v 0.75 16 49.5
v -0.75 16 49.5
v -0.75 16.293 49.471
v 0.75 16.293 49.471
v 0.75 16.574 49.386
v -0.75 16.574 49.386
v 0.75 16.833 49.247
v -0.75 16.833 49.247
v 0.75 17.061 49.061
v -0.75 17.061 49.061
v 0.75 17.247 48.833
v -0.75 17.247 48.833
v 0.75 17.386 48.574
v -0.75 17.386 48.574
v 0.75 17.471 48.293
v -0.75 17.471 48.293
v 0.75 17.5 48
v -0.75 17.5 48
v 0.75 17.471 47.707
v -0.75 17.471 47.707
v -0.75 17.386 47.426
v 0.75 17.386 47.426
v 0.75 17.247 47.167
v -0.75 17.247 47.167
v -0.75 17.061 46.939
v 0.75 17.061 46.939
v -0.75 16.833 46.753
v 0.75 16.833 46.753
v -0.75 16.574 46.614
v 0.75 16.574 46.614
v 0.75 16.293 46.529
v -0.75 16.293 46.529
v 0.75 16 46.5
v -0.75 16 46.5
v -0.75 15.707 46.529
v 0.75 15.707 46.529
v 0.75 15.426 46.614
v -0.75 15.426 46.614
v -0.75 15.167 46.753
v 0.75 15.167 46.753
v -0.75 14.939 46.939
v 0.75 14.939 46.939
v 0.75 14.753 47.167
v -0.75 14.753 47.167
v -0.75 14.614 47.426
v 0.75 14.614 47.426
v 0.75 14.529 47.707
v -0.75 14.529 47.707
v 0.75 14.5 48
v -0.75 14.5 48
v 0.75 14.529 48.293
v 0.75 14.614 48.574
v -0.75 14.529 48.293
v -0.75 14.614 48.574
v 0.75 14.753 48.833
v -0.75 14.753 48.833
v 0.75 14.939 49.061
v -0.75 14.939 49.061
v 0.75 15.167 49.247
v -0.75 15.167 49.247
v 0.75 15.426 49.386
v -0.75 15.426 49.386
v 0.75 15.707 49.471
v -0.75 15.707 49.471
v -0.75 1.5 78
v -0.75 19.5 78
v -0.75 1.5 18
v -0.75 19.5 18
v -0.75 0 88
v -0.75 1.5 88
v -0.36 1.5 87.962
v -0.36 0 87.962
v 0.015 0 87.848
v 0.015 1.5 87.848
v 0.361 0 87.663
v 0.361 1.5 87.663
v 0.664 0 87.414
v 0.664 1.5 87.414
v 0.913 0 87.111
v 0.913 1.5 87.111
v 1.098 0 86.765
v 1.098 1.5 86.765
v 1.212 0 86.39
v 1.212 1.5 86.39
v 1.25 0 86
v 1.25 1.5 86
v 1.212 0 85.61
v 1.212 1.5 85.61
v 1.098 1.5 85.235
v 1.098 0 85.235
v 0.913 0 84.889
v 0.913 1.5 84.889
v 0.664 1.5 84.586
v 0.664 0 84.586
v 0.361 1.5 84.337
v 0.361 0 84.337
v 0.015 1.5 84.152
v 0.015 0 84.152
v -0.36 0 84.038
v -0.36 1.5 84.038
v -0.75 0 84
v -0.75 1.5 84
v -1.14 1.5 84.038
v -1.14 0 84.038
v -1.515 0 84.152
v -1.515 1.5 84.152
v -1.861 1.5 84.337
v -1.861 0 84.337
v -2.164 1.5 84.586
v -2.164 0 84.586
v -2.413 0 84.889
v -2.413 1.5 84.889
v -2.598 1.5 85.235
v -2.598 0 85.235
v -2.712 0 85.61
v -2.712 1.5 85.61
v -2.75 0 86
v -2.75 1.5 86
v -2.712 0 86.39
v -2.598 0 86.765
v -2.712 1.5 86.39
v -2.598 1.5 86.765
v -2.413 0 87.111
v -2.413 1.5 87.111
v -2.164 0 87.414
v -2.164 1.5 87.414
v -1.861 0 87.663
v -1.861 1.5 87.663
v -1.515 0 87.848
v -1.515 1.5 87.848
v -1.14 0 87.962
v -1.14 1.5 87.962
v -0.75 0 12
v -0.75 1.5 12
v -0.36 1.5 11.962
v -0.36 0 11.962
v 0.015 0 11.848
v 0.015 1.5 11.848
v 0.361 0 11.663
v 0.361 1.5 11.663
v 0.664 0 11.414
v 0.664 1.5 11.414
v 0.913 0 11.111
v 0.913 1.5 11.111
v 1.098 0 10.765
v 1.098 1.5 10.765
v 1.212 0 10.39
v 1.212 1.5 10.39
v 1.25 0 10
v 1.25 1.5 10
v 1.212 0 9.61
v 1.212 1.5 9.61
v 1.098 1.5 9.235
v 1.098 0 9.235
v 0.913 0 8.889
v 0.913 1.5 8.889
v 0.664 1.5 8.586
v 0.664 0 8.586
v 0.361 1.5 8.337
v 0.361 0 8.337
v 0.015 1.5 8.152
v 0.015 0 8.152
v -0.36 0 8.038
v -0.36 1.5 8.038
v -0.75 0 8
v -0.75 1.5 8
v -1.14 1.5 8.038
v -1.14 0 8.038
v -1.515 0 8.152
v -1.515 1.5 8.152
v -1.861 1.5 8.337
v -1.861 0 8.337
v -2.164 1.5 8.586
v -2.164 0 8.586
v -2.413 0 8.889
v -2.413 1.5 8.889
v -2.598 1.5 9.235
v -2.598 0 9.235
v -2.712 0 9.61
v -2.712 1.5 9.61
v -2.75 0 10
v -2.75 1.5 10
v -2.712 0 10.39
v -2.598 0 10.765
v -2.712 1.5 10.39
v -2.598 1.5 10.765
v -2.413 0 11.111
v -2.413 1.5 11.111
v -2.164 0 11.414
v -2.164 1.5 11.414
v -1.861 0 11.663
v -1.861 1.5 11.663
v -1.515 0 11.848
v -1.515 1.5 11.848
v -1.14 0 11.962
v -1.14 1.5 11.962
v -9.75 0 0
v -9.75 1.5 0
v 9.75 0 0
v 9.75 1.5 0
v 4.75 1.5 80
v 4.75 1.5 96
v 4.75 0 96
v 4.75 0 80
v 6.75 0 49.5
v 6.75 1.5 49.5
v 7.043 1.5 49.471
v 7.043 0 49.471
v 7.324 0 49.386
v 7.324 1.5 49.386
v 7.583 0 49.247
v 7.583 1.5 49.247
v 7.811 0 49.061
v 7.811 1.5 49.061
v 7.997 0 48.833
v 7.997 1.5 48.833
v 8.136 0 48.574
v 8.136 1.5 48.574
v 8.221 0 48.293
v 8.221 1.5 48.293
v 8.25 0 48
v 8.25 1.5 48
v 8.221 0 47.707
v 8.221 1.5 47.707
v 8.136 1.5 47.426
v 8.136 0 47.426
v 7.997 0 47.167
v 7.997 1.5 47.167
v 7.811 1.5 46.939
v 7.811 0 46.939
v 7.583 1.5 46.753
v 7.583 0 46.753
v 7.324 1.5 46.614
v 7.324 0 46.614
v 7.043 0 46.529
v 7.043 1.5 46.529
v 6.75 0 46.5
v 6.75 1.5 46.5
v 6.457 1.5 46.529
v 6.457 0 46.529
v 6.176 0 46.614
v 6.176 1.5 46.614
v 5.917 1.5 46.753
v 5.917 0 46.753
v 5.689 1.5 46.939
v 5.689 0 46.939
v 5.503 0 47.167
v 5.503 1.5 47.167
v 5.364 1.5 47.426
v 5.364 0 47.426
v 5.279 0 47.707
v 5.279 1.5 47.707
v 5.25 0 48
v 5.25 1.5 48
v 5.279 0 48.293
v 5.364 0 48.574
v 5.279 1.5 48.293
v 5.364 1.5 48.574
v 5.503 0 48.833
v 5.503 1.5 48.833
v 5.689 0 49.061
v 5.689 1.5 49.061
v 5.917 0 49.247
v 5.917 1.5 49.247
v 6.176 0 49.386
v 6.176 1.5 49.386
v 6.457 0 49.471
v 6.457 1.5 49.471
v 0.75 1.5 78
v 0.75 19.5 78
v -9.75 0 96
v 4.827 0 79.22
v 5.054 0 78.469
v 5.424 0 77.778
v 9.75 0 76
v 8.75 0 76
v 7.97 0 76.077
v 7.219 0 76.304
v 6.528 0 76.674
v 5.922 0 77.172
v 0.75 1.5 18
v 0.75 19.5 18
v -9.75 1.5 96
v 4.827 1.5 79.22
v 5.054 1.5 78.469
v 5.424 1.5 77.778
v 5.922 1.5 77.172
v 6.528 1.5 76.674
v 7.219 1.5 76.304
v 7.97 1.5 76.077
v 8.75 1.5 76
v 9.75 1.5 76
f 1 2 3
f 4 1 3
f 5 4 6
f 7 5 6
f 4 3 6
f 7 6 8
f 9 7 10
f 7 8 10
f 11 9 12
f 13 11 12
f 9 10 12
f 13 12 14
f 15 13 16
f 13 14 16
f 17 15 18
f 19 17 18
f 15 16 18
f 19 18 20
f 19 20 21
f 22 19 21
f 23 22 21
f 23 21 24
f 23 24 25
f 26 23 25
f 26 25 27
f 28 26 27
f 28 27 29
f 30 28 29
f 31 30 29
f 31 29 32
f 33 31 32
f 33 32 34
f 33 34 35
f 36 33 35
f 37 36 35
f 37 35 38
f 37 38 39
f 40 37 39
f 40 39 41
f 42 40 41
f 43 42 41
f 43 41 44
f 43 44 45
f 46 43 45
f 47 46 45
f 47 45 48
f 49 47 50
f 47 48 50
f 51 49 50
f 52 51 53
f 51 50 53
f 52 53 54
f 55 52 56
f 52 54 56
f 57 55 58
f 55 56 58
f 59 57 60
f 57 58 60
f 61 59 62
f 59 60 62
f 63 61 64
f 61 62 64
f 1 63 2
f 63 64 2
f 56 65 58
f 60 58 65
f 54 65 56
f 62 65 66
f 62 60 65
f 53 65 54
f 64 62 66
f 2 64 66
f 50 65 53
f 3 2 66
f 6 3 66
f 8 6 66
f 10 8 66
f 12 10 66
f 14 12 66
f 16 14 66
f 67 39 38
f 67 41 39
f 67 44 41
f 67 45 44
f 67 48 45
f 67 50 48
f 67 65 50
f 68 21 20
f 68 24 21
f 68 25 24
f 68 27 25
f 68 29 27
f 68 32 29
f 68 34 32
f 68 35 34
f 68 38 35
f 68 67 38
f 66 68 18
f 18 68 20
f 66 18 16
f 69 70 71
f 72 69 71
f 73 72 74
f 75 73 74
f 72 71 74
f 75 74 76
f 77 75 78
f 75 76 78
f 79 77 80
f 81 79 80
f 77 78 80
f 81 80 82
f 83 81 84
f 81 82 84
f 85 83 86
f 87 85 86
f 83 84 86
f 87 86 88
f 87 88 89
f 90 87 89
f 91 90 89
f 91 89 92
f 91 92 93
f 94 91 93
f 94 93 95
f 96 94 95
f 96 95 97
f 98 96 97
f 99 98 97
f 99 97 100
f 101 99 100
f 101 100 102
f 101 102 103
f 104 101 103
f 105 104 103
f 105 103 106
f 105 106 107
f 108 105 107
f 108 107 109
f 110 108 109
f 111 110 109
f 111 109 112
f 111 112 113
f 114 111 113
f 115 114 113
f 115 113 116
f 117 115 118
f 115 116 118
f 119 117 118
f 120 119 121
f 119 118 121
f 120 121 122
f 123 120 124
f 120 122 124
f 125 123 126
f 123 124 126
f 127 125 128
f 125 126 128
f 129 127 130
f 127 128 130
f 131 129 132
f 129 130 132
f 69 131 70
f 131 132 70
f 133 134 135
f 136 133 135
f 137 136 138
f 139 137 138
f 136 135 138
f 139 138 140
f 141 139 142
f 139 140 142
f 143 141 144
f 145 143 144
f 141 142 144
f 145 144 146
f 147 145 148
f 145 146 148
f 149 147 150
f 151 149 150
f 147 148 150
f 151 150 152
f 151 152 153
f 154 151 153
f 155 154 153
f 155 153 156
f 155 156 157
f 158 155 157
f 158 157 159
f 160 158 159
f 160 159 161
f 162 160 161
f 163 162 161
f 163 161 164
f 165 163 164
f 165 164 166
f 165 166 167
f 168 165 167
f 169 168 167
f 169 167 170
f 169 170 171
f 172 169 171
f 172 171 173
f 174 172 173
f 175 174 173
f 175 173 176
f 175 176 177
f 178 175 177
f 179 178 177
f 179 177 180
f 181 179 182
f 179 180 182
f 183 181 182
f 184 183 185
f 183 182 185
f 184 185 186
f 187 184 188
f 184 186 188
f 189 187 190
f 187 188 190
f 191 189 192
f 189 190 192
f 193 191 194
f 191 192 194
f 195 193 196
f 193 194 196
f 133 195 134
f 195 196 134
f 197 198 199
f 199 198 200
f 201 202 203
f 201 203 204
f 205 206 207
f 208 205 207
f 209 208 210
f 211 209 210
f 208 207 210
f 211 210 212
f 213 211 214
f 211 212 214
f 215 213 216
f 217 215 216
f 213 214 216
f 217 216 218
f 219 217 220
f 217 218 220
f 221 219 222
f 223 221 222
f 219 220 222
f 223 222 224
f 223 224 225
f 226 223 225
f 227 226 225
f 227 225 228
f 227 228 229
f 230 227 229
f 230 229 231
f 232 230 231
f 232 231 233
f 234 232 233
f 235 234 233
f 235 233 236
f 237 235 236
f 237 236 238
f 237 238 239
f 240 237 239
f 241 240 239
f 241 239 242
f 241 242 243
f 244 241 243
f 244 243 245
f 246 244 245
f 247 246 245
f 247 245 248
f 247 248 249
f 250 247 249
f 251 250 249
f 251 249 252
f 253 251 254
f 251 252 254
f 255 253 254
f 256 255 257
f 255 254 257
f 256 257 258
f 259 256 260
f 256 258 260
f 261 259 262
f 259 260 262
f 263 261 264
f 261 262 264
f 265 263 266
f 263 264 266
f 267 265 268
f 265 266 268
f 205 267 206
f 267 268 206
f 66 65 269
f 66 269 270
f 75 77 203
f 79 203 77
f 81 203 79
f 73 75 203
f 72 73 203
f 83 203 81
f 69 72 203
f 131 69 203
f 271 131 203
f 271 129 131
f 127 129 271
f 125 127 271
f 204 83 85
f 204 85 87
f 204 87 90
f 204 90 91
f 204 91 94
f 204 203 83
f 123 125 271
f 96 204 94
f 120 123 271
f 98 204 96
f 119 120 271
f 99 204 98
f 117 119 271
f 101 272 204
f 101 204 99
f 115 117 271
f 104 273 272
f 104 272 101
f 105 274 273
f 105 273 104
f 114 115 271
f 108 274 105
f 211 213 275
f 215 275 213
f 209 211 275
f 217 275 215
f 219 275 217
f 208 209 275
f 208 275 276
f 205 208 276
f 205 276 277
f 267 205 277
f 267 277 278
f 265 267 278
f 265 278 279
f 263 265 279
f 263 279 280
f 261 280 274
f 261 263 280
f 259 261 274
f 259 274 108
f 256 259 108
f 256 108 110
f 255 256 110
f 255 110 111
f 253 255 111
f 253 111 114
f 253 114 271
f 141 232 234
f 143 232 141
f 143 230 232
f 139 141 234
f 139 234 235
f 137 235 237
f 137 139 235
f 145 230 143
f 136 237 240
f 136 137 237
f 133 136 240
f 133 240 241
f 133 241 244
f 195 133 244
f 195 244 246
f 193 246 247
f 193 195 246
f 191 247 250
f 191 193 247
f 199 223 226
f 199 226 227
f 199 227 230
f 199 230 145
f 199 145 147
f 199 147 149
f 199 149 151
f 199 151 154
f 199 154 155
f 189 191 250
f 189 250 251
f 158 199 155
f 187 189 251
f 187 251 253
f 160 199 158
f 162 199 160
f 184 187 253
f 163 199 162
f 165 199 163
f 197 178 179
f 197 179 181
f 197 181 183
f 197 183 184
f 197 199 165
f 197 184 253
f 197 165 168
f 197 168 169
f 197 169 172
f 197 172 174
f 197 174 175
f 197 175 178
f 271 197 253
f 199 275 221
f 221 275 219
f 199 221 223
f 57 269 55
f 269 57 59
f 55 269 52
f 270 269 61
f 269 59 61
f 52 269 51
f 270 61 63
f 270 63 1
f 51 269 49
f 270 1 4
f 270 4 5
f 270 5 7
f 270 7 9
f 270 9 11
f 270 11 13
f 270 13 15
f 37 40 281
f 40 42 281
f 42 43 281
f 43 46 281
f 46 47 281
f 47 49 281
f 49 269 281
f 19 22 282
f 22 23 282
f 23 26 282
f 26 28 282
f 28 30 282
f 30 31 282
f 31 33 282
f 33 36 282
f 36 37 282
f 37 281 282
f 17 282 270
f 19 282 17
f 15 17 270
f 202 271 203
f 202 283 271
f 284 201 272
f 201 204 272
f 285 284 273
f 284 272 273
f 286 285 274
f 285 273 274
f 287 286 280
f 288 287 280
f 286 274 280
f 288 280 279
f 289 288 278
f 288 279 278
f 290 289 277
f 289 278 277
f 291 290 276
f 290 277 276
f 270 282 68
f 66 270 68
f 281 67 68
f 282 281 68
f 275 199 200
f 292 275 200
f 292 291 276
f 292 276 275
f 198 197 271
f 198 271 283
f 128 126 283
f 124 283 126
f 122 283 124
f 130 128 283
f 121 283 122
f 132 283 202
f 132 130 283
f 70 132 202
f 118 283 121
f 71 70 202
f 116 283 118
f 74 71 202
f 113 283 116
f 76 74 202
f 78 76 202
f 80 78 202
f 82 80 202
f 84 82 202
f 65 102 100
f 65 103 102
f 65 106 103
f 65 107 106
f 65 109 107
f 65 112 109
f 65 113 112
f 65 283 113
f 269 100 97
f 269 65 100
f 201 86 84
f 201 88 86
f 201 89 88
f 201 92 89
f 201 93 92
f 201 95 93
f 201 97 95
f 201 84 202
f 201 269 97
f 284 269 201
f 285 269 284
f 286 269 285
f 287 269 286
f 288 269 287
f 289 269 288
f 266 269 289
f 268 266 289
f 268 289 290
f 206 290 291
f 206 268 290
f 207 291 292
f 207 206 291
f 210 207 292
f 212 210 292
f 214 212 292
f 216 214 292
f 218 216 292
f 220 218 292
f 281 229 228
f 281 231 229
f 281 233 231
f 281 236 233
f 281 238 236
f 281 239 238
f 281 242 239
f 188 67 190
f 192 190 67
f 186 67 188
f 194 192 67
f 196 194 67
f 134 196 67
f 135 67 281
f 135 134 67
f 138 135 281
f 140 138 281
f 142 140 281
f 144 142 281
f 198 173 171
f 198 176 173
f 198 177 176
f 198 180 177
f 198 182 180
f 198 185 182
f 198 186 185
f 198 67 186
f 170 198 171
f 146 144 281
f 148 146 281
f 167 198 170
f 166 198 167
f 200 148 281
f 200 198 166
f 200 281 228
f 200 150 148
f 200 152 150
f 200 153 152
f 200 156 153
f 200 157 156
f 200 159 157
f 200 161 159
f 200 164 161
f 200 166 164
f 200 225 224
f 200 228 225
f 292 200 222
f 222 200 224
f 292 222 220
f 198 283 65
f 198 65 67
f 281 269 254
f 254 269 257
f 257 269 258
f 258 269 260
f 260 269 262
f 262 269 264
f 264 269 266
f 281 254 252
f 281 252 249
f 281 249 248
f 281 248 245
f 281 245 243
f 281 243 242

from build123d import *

# Parameters (mm, degrees)
ESQUISSE1_W             = 19.5
ESQUISSE1_H             = 1.5
EXTRU_MINCE1_DEPTH      = 96
ESQUISSE2_W             = 1.5
ESQUISSE2_H             = 19.5
EXTRU_MINCE2_DEPTH      = 96
ESQUISSE3_R             = 1.5
ESQUISSE3_W             = 18
ESQUISSE3_H             = 18
ENL_V_MAT_EXTRU_1_DEPTH = 3
ESQUISSE4_R             = 2
ESQUISSE4_R_2           = 1.5
ESQUISSE4_W             = 5
ESQUISSE4_H             = 20
ENL_V_MAT_EXTRU_2_DEPTH = 3
CONG_1_R                = 4


with BuildPart() as part:
    # Esquisse1 → Extru.-Mince1 (new body)
    with BuildSketch(Plane.XY):
        with Locations((0, 0.75)):
            Rectangle(ESQUISSE1_W, ESQUISSE1_H)
    extrude(amount=EXTRU_MINCE1_DEPTH)

    # Esquisse2 → Extru.-Mince2 (add)
    with BuildSketch(Plane(origin=(0, 0, 0), x_dir=(-1, 0, 0), z_dir=(0, 0, -1))):
        with Locations((0, 9.75)):
            Rectangle(ESQUISSE2_W, ESQUISSE2_H)
    extrude(amount=-EXTRU_MINCE2_DEPTH)

    # Esquisse3 → Enlèv. mat.-Extru.1 (cut)
    with BuildSketch(Plane.ZY.offset(0.75)):
        with Locations((48, 16)):
            Circle(ESQUISSE3_R)
        with Locations((9, 10.5)):
            Rectangle(ESQUISSE3_W, ESQUISSE3_H)
        with Locations((87, 10.5)):
            Rectangle(ESQUISSE3_W, ESQUISSE3_H)
    extrude(amount=-ENL_V_MAT_EXTRU_1_DEPTH, mode=Mode.SUBTRACT)

    # Esquisse4 → Enlèv. mat.-Extru.2 (cut)
    with BuildSketch(Plane(origin=(0, 1.5, 0), x_dir=(1, 0, 0), z_dir=(0, 1, 0))):
        with Locations(Location((-0.75, -10, 0), (0, 0, 270))):
            Circle(ESQUISSE4_R)
        with Locations(Location((-0.75, -86, 0), (0, 0, 270))):
            Circle(ESQUISSE4_R)
        with Locations(Location((6.75, -48, 0), (0, 0, 270))):
            Circle(ESQUISSE4_R_2)
        with Locations((7.25, -86)):
            Rectangle(ESQUISSE4_W, ESQUISSE4_H)
    extrude(amount=-ENL_V_MAT_EXTRU_2_DEPTH, mode=Mode.SUBTRACT)

    # Congé1
    cong_1_edges = [part.edges().sort_by_distance(p)[0] for p in [
        (4.75, 0.75, 76),
    ]]
    fillet(cong_1_edges, radius=CONG_1_R)


solid = part.part
